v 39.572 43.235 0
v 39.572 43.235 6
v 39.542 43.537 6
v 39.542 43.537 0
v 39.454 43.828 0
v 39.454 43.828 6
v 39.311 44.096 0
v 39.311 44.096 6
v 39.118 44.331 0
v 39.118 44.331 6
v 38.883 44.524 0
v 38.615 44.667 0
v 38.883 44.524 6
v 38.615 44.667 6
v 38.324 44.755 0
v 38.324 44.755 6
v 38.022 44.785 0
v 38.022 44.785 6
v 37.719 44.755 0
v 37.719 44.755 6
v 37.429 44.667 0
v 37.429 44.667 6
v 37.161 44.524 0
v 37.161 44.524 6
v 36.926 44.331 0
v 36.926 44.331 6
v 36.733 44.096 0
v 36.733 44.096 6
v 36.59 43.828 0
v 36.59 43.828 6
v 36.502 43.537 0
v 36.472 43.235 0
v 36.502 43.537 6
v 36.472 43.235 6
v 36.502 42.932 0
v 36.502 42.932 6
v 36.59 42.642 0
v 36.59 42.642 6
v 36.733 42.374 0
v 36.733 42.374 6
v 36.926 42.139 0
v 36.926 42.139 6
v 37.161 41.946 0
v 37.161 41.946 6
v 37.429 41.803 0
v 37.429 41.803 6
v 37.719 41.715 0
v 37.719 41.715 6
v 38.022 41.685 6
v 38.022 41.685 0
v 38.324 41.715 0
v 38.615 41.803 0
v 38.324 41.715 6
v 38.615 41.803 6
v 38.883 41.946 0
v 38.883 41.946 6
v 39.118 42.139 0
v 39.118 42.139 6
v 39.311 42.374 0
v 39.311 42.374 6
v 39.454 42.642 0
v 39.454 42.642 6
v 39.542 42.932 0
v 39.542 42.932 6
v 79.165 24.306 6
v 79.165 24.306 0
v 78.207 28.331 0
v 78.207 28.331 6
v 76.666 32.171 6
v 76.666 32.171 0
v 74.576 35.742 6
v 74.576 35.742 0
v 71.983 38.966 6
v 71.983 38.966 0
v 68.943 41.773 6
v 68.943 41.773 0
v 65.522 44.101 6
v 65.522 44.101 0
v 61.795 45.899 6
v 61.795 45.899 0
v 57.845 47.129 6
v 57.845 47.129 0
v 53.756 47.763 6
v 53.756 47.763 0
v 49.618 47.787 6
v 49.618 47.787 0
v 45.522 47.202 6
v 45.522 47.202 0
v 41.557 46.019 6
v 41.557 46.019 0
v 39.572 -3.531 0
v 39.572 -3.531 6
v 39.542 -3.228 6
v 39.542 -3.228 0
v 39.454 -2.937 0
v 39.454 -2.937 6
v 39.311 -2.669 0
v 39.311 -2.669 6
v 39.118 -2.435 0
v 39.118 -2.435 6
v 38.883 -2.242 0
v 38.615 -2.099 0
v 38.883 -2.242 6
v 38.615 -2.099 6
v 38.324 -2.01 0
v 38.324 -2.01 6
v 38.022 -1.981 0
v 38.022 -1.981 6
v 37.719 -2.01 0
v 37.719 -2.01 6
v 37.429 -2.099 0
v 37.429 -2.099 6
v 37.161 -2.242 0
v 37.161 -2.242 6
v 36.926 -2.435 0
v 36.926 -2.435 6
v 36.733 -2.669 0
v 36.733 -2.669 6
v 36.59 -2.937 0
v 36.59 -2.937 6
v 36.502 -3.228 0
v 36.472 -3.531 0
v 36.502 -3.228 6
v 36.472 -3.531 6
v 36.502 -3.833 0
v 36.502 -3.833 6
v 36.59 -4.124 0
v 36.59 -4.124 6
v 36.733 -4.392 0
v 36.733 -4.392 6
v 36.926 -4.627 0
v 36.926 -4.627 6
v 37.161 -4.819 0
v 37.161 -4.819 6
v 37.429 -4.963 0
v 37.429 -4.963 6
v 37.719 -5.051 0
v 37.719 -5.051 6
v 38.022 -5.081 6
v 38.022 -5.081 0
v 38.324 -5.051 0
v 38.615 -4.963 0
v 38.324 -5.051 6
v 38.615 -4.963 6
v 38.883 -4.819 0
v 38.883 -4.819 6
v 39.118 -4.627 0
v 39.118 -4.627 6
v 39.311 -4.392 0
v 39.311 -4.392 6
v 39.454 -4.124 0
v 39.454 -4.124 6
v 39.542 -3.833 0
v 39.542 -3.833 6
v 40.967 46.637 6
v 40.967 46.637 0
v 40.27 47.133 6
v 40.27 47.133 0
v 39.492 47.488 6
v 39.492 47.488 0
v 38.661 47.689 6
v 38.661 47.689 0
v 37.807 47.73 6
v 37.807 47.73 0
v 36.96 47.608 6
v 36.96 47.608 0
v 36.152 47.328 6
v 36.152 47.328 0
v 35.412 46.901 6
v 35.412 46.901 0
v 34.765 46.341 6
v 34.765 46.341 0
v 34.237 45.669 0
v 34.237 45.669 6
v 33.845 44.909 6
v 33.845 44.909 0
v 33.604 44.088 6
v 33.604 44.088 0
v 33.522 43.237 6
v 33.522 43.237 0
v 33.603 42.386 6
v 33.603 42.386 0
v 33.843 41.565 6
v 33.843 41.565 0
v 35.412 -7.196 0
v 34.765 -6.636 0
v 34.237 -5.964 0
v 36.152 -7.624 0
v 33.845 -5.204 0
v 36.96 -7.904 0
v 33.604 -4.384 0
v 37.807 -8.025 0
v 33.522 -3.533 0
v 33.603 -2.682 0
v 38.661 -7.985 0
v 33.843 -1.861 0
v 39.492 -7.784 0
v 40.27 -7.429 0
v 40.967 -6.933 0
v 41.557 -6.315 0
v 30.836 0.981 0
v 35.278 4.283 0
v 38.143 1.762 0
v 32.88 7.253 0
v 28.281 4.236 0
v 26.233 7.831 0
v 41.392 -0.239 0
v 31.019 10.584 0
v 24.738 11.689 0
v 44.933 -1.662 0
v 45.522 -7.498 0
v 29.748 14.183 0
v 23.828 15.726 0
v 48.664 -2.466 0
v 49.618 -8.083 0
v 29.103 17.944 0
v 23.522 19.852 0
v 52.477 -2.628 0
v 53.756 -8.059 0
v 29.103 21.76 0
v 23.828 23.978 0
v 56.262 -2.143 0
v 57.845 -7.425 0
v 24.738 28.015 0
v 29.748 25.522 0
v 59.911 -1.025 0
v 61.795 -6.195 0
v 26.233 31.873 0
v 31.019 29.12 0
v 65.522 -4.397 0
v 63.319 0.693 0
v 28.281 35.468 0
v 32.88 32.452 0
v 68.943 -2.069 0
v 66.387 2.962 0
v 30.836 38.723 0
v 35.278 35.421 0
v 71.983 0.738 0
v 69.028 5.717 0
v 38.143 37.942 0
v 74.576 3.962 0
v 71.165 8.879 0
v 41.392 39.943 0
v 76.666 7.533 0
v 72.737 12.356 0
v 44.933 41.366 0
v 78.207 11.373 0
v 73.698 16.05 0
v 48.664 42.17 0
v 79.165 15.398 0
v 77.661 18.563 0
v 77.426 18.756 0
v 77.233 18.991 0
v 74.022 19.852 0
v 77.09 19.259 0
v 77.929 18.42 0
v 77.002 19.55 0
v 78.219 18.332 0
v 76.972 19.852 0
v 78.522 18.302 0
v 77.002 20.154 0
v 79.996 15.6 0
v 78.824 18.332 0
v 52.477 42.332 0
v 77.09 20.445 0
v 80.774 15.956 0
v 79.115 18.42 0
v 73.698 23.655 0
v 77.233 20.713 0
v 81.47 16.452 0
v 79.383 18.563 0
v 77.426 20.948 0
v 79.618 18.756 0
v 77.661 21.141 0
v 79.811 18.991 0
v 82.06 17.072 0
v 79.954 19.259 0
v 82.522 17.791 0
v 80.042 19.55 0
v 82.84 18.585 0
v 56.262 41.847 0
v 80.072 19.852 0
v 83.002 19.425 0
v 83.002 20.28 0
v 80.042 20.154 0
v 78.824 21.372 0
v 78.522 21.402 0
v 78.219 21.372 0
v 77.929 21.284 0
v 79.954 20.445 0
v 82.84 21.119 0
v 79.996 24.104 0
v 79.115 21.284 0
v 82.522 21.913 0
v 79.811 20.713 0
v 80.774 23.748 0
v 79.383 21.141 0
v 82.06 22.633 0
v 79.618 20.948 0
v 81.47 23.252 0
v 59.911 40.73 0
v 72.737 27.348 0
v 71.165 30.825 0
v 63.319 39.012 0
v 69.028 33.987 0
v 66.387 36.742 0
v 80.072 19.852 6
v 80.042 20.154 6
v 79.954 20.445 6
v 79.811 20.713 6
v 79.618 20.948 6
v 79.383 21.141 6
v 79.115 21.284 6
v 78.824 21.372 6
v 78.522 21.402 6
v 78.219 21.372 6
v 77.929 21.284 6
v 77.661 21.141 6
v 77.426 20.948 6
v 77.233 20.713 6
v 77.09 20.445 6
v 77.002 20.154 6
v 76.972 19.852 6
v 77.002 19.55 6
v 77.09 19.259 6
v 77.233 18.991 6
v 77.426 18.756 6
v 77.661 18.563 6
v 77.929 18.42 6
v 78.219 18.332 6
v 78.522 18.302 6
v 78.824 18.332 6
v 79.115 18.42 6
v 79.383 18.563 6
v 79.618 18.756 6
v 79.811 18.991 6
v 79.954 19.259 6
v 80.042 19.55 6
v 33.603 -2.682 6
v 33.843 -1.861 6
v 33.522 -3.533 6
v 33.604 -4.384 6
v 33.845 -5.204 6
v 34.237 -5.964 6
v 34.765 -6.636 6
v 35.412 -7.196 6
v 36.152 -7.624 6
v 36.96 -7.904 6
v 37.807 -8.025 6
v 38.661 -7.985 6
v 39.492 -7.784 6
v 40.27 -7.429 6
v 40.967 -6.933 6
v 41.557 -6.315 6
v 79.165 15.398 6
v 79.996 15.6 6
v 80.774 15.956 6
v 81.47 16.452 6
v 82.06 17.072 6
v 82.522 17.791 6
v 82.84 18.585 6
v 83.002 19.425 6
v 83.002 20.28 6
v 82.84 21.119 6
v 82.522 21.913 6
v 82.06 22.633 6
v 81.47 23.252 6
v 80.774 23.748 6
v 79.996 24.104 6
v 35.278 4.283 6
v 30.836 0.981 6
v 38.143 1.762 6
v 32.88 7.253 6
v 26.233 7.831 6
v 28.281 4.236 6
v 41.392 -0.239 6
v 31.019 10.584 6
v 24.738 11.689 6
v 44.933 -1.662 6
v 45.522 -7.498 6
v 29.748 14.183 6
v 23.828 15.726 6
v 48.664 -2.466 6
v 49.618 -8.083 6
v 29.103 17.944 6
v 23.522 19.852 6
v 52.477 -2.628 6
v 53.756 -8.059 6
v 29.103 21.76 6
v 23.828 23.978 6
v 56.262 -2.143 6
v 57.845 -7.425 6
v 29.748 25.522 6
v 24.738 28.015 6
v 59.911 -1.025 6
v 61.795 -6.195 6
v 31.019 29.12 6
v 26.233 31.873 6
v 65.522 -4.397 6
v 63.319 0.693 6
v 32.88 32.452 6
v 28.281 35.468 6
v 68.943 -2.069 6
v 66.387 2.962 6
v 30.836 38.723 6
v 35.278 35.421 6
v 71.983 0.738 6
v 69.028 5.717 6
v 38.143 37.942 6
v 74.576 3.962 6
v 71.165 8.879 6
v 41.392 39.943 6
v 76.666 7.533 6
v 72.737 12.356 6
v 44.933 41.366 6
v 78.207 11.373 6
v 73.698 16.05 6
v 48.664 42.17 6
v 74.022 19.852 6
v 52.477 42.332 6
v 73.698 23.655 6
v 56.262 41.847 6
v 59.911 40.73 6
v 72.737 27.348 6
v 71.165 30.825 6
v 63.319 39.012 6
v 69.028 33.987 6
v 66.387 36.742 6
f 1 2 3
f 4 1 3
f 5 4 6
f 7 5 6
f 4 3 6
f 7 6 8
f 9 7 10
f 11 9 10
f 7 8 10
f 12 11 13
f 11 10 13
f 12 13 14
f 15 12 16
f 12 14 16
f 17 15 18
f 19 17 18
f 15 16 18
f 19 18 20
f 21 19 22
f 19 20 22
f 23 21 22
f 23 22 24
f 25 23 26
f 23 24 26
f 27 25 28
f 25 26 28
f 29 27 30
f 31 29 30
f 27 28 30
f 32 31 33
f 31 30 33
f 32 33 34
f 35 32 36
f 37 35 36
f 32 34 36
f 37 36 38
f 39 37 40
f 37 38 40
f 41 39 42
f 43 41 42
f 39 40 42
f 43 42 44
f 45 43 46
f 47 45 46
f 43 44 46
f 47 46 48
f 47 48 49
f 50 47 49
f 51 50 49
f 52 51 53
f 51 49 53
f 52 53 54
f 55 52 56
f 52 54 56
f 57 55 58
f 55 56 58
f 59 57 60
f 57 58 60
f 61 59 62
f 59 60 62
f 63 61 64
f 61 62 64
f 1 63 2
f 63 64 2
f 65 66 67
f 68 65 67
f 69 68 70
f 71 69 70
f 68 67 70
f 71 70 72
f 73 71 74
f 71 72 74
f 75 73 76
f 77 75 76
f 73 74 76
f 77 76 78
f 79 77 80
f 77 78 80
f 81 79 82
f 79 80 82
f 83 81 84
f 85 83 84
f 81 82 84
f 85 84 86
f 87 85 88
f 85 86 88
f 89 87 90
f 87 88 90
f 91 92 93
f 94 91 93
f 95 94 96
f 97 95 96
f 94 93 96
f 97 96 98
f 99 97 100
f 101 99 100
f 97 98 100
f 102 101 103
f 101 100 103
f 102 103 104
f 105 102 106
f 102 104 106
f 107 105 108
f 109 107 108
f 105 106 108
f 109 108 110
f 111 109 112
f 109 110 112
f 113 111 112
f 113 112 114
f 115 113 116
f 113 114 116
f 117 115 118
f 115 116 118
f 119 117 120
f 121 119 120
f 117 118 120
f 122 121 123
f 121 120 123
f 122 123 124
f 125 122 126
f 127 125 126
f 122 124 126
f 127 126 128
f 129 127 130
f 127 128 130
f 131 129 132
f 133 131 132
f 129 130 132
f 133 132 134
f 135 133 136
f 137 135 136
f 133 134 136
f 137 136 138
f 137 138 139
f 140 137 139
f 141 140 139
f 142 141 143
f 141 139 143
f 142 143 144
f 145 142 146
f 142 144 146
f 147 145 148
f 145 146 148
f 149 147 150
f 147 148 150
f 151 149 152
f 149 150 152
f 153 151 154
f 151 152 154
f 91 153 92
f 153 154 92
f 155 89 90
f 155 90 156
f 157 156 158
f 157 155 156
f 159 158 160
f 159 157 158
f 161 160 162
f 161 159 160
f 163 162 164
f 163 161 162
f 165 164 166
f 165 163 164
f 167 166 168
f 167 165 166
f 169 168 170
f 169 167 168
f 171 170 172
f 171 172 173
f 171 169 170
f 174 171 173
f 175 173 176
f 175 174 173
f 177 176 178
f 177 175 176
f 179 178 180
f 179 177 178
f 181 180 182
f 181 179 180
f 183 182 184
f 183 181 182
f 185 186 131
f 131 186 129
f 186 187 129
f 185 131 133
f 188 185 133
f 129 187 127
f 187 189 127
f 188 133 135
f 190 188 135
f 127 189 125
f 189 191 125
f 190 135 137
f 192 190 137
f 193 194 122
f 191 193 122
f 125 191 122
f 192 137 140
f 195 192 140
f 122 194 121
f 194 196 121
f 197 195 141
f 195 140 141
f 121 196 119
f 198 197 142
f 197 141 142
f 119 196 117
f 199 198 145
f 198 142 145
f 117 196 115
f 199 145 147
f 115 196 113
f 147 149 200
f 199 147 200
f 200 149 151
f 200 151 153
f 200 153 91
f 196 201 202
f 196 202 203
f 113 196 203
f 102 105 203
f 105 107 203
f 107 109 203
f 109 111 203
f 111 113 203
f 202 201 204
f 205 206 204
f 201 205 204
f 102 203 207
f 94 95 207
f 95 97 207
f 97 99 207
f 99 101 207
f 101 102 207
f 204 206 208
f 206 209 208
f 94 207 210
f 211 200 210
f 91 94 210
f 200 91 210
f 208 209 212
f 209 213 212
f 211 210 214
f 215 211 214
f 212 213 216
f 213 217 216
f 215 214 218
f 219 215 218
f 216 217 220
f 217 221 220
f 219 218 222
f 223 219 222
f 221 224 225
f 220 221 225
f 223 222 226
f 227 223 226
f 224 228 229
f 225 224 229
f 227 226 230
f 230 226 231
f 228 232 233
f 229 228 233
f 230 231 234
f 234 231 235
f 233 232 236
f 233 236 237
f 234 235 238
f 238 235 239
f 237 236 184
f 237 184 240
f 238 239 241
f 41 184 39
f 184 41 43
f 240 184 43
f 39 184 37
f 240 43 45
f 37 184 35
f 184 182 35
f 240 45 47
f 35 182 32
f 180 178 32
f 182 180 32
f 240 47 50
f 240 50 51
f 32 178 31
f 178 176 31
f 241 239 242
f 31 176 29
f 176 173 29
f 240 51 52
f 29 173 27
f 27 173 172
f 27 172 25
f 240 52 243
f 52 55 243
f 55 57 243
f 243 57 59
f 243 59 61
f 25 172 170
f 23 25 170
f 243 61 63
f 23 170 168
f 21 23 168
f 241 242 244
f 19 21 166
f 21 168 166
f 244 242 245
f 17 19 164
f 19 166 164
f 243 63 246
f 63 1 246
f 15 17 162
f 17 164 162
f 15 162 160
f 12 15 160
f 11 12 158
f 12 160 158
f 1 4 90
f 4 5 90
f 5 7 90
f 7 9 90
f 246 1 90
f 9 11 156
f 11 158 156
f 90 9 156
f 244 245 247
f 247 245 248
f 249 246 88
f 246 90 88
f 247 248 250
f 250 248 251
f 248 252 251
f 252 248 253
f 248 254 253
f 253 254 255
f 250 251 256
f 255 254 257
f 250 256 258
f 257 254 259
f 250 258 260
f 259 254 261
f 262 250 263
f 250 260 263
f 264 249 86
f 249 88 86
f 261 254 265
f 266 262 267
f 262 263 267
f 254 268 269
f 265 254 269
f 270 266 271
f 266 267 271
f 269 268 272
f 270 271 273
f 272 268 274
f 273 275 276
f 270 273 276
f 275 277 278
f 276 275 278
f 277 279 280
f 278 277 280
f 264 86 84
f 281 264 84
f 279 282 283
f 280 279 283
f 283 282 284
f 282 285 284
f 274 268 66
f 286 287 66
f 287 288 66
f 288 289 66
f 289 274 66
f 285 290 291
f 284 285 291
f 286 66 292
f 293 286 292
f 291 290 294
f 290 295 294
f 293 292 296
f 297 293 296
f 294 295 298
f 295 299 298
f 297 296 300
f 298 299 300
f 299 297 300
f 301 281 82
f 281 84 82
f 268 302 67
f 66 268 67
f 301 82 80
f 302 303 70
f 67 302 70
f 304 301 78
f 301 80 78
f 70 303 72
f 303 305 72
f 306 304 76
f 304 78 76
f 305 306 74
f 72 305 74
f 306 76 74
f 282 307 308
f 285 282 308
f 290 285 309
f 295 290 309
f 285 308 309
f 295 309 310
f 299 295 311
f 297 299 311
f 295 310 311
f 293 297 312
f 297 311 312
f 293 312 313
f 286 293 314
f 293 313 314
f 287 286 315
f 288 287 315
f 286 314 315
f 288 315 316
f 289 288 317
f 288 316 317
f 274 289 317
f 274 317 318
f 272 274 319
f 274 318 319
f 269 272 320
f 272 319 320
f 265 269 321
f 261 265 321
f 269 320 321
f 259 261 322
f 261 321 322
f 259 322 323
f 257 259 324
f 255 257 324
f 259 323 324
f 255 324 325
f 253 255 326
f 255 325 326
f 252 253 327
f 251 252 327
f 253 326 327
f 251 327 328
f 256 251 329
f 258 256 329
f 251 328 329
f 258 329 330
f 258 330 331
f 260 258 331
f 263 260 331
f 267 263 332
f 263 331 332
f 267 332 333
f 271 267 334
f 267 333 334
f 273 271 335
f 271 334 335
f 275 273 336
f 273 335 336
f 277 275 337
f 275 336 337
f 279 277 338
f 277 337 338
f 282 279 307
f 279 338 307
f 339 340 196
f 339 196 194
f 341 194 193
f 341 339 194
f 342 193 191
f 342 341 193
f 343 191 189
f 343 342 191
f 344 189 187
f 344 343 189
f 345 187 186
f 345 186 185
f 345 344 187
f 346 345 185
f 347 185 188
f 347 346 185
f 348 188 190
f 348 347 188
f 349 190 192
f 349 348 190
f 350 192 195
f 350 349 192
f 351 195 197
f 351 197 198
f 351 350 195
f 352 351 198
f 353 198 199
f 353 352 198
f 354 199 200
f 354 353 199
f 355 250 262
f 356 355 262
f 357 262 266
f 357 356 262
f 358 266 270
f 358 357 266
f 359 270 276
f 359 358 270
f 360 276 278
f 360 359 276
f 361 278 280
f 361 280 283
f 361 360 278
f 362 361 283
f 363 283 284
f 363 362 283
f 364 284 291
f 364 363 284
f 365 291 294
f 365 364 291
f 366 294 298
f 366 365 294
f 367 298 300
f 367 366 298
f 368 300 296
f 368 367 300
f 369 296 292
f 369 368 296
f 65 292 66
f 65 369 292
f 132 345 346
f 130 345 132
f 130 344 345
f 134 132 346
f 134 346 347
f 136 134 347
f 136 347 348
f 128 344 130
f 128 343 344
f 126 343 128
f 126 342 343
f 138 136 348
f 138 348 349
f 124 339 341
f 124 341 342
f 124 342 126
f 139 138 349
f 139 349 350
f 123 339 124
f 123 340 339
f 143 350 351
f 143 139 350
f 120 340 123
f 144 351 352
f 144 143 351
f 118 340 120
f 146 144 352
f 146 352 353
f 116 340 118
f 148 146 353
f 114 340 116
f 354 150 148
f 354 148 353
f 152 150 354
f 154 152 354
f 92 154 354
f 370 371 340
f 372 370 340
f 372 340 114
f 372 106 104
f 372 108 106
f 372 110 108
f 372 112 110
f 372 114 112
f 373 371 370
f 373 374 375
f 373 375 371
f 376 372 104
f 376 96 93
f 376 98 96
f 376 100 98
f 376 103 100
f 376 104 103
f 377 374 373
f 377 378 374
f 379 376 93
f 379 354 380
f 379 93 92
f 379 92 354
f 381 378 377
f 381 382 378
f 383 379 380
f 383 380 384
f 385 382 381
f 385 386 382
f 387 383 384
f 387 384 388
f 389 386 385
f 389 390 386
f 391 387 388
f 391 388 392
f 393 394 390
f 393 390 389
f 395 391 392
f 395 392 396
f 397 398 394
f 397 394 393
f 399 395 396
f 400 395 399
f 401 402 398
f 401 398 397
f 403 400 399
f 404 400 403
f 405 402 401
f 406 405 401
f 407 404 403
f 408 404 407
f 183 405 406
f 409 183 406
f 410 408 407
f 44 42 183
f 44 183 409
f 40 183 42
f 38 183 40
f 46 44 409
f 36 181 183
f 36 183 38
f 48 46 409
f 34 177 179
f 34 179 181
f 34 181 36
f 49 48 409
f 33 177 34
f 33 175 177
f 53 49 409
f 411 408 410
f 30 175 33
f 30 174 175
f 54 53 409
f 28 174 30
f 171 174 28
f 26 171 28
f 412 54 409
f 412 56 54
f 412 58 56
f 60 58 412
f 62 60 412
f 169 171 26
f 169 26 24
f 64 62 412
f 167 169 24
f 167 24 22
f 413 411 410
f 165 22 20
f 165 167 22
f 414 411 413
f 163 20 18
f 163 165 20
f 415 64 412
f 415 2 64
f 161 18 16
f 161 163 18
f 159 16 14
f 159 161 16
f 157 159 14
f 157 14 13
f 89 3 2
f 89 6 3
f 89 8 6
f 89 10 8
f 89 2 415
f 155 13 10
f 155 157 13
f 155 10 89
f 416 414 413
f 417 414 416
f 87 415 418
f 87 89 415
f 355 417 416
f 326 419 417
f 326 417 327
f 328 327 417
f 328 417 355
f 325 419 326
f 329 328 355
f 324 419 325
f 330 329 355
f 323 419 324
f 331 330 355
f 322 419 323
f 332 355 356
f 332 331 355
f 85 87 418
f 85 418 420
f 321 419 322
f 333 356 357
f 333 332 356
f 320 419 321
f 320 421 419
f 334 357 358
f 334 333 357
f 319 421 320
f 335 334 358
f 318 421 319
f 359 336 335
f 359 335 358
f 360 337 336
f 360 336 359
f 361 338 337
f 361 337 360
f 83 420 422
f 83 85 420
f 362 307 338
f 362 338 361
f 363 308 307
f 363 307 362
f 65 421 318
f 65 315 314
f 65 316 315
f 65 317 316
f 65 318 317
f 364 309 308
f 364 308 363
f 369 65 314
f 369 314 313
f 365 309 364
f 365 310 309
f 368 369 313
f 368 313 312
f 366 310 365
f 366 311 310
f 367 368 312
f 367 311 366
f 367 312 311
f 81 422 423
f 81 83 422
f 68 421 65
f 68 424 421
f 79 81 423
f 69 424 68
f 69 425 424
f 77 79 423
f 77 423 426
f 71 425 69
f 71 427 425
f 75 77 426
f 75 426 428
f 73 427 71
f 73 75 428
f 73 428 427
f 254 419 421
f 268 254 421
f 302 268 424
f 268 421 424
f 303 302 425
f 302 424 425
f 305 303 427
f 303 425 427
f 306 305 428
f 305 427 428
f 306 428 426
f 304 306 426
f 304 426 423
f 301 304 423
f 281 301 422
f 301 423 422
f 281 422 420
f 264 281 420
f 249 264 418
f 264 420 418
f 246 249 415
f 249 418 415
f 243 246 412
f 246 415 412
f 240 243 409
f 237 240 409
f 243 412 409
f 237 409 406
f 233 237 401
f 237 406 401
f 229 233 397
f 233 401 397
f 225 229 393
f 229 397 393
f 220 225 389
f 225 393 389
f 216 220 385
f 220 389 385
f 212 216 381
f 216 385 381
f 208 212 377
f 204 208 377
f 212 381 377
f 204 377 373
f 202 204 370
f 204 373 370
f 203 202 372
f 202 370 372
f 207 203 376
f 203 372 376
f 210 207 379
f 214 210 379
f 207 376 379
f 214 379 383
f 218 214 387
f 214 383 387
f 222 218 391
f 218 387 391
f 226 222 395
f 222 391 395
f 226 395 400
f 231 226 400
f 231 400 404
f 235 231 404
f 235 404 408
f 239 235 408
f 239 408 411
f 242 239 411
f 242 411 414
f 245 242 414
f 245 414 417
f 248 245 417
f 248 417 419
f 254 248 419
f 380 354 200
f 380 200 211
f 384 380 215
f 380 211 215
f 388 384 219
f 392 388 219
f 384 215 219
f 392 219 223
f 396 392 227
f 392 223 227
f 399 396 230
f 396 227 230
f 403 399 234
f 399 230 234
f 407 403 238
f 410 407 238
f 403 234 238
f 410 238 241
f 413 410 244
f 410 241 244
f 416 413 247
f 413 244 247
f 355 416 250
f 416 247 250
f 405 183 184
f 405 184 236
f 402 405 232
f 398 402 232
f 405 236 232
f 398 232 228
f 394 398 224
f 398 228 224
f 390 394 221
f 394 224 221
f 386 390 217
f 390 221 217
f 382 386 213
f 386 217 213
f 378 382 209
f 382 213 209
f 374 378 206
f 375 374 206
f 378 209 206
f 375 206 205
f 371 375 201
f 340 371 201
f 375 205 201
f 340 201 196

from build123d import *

# Parameters (mm, degrees)
SZKIC1_R                    = 28
DODANIE_WYCI_GNI_CIE1_DEPTH = 6
SZKIC3_R                    = 22.5
WYTNIJ_WYCI_GNI_CIE1_DEPTH  = 6
SZKIC5_R                    = 4.5
DODANIE_WYCI_GNI_CIE2_DEPTH = 6
SZKIC6_R                    = 1.55
WYTNIJ_WYCI_GNI_CIE2_DEPTH  = 6


with BuildPart() as part:
    # Szkic1 → Dodanie-wyciągnięcie1 (new body)
    with BuildSketch(Plane.XY):
        with Locations((51.52186297, 19.852107637)):
            Circle(SZKIC1_R)
    extrude(amount=DODANIE_WYCI_GNI_CIE1_DEPTH)

    # Szkic3 → Wytnij-wyciągnięcie1 (cut)
    with BuildSketch(Plane.XY.offset(6)):
        with Locations((51.52186297, 19.852107637)):
            Circle(SZKIC3_R)
    extrude(amount=-WYTNIJ_WYCI_GNI_CIE1_DEPTH, mode=Mode.SUBTRACT)

    # Szkic5 → Dodanie-wyciągnięcie2 (add)
    with BuildSketch(Plane.XY.offset(6)):
        with Locations((78.52186297, 19.852107638)):
            Circle(SZKIC5_R)
        with Locations((38.02186297, -3.530578265)):
            Circle(SZKIC5_R)
        with Locations((38.02186297, 43.23479354)):
            Circle(SZKIC5_R)
    extrude(amount=-DODANIE_WYCI_GNI_CIE2_DEPTH)

    # Szkic6 → Wytnij-wyciągnięcie2 (cut)
    with BuildSketch(Plane.XY.offset(6)):
        with Locations((78.52186297, 19.852107638)):
            Circle(SZKIC6_R)
        with Locations((38.02186297, -3.530578265)):
            Circle(SZKIC6_R)
        with Locations((38.02186297, 43.23479354)):
            Circle(SZKIC6_R)
    extrude(amount=-WYTNIJ_WYCI_GNI_CIE2_DEPTH, mode=Mode.SUBTRACT)


solid = part.part
